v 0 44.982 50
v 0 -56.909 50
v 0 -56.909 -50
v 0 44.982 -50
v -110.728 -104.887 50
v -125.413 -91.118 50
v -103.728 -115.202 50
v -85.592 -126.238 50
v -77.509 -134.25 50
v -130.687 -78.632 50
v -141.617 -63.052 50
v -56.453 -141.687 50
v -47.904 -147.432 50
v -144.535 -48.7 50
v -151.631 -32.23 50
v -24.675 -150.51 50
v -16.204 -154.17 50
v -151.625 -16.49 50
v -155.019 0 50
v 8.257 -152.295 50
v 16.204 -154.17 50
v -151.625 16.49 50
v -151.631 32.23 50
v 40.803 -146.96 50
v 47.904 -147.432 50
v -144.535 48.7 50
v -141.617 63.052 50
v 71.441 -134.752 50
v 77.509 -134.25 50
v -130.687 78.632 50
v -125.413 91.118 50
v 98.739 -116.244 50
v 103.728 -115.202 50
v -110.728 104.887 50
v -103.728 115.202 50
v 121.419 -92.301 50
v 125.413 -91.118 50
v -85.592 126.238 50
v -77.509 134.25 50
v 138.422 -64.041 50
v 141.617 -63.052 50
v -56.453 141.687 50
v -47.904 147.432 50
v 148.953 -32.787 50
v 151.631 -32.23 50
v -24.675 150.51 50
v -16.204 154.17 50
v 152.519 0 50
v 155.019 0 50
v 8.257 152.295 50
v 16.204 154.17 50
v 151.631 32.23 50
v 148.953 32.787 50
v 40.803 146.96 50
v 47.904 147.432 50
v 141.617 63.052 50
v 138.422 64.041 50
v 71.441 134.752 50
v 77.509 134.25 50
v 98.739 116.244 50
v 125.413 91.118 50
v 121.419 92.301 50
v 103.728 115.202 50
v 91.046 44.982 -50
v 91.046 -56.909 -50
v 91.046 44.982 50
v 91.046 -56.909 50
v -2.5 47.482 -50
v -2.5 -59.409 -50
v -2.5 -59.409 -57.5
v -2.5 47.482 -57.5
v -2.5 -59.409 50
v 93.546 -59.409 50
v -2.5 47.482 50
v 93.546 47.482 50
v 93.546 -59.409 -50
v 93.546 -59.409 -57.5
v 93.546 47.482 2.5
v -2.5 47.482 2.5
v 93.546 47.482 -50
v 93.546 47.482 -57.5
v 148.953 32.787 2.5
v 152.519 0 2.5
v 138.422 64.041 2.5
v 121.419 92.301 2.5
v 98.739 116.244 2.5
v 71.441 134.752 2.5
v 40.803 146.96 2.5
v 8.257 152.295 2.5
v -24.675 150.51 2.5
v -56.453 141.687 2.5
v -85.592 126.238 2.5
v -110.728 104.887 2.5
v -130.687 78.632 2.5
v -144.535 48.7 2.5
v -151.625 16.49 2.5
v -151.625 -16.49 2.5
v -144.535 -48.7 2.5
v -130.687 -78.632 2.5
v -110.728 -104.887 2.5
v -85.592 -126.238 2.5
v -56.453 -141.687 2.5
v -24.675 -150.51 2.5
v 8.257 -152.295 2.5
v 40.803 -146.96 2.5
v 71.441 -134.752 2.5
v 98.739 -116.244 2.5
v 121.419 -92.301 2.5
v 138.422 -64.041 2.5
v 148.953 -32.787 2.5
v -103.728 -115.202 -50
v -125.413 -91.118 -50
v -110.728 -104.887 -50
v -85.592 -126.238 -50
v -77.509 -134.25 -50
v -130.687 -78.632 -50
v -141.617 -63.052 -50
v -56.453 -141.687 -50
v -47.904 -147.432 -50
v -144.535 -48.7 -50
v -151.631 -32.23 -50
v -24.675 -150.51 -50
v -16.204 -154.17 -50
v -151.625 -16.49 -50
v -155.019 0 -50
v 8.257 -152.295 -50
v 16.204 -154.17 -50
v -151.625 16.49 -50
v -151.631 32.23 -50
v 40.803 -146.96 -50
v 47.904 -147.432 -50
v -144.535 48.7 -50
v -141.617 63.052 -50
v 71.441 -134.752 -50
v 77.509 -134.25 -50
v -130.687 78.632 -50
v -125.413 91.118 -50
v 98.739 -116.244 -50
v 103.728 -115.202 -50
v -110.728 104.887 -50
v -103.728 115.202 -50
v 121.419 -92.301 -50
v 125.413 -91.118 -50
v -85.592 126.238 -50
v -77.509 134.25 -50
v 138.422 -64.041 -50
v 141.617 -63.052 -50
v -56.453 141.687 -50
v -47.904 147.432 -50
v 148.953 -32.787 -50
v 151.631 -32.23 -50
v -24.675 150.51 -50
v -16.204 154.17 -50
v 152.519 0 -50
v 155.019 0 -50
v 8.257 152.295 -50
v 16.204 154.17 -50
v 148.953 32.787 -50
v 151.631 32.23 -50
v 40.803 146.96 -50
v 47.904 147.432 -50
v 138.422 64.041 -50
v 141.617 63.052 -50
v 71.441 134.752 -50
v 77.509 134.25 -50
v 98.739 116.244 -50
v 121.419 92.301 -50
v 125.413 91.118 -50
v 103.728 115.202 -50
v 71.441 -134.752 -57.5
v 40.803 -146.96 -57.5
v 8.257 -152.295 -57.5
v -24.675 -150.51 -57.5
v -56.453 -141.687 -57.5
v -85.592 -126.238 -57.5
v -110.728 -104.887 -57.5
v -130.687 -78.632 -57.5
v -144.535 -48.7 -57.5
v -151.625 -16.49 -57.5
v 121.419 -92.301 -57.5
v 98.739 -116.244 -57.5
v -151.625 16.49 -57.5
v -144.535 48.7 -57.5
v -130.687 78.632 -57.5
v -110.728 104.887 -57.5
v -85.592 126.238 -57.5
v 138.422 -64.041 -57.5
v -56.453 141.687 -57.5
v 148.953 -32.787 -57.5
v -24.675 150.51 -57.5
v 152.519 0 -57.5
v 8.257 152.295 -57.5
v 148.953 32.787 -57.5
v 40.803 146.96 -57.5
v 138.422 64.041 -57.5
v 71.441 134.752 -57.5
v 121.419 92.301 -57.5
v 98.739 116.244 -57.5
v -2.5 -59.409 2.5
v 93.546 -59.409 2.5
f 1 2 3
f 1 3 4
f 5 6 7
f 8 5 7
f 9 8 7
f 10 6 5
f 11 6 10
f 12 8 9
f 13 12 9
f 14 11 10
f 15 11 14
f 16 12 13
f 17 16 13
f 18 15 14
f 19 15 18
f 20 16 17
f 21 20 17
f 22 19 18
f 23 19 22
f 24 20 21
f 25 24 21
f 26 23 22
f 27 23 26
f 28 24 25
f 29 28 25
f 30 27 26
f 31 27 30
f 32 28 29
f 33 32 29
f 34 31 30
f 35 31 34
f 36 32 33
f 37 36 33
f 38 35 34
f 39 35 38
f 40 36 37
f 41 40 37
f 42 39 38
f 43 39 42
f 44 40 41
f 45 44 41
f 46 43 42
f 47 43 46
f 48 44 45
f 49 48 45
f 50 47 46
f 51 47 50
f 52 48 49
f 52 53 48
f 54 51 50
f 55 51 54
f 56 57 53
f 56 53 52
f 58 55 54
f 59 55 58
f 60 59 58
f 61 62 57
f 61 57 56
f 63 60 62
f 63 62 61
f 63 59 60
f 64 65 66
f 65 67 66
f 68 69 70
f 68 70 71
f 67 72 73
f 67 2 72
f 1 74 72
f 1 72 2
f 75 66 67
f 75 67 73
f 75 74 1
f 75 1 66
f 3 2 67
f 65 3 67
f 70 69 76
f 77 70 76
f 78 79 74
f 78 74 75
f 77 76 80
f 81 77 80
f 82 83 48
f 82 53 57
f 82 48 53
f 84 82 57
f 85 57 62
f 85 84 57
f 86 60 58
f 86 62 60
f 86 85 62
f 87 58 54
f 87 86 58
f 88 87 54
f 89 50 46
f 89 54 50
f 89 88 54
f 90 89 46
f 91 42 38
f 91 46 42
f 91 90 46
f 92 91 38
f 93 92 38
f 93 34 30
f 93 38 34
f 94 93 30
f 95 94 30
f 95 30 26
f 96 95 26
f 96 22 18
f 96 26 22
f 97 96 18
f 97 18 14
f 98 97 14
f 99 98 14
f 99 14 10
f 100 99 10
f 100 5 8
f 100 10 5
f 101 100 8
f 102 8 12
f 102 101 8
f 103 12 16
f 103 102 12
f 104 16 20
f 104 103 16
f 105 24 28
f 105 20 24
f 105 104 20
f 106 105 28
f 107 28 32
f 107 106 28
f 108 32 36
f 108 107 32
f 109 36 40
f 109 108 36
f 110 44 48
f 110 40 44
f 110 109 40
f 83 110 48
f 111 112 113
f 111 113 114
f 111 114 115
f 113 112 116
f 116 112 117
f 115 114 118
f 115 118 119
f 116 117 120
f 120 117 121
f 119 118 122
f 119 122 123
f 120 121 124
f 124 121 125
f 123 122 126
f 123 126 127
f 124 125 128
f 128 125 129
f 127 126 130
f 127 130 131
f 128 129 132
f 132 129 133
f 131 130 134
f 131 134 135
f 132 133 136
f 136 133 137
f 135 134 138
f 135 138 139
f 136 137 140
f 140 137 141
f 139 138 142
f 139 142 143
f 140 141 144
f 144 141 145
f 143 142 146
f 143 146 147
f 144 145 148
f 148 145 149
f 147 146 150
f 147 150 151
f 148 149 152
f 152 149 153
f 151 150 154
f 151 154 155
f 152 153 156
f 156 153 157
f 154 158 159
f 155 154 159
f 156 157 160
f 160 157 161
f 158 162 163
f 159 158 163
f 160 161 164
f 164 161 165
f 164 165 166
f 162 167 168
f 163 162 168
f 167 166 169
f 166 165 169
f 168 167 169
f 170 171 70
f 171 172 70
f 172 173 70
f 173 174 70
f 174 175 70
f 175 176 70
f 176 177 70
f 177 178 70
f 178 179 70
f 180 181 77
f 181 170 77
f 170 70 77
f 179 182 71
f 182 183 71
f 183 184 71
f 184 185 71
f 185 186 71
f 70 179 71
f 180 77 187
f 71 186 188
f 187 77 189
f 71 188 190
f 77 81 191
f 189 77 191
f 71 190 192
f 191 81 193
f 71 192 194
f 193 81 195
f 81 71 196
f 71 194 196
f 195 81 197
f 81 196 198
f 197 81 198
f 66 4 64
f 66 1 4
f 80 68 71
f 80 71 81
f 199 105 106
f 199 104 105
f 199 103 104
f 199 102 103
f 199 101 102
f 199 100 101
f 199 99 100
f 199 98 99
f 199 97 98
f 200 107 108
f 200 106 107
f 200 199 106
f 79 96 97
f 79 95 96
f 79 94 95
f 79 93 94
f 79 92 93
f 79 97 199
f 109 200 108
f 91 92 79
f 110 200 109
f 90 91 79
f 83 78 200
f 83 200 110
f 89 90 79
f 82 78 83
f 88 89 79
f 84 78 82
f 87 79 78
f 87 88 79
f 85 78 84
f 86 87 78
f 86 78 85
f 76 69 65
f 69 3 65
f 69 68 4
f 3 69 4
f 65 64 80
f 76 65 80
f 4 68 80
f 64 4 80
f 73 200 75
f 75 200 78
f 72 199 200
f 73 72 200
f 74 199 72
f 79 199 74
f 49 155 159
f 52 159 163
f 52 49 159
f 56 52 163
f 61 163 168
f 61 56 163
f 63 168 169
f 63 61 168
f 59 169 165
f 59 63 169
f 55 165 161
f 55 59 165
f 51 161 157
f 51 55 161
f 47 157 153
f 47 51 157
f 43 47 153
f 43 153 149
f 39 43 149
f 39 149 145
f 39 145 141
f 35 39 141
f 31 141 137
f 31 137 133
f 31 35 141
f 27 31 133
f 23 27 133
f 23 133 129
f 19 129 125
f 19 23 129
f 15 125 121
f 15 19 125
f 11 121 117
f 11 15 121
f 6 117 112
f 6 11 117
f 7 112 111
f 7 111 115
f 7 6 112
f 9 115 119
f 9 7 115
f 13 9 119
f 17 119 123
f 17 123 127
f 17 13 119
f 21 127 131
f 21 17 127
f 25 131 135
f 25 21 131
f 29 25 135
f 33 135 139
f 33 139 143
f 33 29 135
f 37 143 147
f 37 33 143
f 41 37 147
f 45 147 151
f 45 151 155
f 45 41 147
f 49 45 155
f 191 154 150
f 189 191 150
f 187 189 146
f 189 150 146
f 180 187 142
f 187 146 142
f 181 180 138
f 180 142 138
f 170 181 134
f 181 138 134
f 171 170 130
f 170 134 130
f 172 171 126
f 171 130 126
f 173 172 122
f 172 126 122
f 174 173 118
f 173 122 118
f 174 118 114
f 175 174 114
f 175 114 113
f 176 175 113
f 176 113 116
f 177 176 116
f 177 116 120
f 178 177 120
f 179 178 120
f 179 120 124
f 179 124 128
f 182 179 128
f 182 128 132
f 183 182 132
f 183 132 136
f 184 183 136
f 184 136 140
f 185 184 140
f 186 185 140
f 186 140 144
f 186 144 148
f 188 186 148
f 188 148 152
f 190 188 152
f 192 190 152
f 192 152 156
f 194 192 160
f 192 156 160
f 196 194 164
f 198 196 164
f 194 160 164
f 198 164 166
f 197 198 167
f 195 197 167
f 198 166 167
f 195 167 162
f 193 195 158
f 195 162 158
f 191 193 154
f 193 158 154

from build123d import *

# Parameters (mm, degrees)
F0_R     = 155.0189943433
F0_W     = 91.0461395979
F0_H     = 101.8910259008
F1_DEPTH = 50
F2_T     = -2.5
F3_DEPTH = 50
F4_DEPTH = 60


with BuildPart() as f1:
    # F0 (on Top) → F1 (new body)
    with BuildSketch(Plane.XY):
        Circle(F0_R)
        with Locations((45.5230697989, -5.9630684555)):
            Rectangle(F0_W, F0_H, mode=Mode.SUBTRACT)
    extrude(amount=F1_DEPTH)

    # F2
    f2_openings = [f1.faces().sort_by_distance(p)[0] for p in [
        (-6.37749, 0.835388, 50),
    ]]
    offset(amount=F2_T, openings=f2_openings, kind=Kind.INTERSECTION)

    # F0 (on Top) → F3 (join)
    with BuildSketch(Plane.XY):
        Circle(F0_R)
        with Locations((45.5230697989, -5.9630684555)):
            Rectangle(F0_W, F0_H, mode=Mode.SUBTRACT)
    extrude(amount=-F3_DEPTH)

    # F4 (add): a face of the model
    f4_faces = [f1.faces().sort_by_distance(p)[0] for p in [
        (-7.4404710718, 0.9746275578, 2.5),
    ]]
    extrude(f4_faces, amount=-F4_DEPTH)


solid = f1.part
